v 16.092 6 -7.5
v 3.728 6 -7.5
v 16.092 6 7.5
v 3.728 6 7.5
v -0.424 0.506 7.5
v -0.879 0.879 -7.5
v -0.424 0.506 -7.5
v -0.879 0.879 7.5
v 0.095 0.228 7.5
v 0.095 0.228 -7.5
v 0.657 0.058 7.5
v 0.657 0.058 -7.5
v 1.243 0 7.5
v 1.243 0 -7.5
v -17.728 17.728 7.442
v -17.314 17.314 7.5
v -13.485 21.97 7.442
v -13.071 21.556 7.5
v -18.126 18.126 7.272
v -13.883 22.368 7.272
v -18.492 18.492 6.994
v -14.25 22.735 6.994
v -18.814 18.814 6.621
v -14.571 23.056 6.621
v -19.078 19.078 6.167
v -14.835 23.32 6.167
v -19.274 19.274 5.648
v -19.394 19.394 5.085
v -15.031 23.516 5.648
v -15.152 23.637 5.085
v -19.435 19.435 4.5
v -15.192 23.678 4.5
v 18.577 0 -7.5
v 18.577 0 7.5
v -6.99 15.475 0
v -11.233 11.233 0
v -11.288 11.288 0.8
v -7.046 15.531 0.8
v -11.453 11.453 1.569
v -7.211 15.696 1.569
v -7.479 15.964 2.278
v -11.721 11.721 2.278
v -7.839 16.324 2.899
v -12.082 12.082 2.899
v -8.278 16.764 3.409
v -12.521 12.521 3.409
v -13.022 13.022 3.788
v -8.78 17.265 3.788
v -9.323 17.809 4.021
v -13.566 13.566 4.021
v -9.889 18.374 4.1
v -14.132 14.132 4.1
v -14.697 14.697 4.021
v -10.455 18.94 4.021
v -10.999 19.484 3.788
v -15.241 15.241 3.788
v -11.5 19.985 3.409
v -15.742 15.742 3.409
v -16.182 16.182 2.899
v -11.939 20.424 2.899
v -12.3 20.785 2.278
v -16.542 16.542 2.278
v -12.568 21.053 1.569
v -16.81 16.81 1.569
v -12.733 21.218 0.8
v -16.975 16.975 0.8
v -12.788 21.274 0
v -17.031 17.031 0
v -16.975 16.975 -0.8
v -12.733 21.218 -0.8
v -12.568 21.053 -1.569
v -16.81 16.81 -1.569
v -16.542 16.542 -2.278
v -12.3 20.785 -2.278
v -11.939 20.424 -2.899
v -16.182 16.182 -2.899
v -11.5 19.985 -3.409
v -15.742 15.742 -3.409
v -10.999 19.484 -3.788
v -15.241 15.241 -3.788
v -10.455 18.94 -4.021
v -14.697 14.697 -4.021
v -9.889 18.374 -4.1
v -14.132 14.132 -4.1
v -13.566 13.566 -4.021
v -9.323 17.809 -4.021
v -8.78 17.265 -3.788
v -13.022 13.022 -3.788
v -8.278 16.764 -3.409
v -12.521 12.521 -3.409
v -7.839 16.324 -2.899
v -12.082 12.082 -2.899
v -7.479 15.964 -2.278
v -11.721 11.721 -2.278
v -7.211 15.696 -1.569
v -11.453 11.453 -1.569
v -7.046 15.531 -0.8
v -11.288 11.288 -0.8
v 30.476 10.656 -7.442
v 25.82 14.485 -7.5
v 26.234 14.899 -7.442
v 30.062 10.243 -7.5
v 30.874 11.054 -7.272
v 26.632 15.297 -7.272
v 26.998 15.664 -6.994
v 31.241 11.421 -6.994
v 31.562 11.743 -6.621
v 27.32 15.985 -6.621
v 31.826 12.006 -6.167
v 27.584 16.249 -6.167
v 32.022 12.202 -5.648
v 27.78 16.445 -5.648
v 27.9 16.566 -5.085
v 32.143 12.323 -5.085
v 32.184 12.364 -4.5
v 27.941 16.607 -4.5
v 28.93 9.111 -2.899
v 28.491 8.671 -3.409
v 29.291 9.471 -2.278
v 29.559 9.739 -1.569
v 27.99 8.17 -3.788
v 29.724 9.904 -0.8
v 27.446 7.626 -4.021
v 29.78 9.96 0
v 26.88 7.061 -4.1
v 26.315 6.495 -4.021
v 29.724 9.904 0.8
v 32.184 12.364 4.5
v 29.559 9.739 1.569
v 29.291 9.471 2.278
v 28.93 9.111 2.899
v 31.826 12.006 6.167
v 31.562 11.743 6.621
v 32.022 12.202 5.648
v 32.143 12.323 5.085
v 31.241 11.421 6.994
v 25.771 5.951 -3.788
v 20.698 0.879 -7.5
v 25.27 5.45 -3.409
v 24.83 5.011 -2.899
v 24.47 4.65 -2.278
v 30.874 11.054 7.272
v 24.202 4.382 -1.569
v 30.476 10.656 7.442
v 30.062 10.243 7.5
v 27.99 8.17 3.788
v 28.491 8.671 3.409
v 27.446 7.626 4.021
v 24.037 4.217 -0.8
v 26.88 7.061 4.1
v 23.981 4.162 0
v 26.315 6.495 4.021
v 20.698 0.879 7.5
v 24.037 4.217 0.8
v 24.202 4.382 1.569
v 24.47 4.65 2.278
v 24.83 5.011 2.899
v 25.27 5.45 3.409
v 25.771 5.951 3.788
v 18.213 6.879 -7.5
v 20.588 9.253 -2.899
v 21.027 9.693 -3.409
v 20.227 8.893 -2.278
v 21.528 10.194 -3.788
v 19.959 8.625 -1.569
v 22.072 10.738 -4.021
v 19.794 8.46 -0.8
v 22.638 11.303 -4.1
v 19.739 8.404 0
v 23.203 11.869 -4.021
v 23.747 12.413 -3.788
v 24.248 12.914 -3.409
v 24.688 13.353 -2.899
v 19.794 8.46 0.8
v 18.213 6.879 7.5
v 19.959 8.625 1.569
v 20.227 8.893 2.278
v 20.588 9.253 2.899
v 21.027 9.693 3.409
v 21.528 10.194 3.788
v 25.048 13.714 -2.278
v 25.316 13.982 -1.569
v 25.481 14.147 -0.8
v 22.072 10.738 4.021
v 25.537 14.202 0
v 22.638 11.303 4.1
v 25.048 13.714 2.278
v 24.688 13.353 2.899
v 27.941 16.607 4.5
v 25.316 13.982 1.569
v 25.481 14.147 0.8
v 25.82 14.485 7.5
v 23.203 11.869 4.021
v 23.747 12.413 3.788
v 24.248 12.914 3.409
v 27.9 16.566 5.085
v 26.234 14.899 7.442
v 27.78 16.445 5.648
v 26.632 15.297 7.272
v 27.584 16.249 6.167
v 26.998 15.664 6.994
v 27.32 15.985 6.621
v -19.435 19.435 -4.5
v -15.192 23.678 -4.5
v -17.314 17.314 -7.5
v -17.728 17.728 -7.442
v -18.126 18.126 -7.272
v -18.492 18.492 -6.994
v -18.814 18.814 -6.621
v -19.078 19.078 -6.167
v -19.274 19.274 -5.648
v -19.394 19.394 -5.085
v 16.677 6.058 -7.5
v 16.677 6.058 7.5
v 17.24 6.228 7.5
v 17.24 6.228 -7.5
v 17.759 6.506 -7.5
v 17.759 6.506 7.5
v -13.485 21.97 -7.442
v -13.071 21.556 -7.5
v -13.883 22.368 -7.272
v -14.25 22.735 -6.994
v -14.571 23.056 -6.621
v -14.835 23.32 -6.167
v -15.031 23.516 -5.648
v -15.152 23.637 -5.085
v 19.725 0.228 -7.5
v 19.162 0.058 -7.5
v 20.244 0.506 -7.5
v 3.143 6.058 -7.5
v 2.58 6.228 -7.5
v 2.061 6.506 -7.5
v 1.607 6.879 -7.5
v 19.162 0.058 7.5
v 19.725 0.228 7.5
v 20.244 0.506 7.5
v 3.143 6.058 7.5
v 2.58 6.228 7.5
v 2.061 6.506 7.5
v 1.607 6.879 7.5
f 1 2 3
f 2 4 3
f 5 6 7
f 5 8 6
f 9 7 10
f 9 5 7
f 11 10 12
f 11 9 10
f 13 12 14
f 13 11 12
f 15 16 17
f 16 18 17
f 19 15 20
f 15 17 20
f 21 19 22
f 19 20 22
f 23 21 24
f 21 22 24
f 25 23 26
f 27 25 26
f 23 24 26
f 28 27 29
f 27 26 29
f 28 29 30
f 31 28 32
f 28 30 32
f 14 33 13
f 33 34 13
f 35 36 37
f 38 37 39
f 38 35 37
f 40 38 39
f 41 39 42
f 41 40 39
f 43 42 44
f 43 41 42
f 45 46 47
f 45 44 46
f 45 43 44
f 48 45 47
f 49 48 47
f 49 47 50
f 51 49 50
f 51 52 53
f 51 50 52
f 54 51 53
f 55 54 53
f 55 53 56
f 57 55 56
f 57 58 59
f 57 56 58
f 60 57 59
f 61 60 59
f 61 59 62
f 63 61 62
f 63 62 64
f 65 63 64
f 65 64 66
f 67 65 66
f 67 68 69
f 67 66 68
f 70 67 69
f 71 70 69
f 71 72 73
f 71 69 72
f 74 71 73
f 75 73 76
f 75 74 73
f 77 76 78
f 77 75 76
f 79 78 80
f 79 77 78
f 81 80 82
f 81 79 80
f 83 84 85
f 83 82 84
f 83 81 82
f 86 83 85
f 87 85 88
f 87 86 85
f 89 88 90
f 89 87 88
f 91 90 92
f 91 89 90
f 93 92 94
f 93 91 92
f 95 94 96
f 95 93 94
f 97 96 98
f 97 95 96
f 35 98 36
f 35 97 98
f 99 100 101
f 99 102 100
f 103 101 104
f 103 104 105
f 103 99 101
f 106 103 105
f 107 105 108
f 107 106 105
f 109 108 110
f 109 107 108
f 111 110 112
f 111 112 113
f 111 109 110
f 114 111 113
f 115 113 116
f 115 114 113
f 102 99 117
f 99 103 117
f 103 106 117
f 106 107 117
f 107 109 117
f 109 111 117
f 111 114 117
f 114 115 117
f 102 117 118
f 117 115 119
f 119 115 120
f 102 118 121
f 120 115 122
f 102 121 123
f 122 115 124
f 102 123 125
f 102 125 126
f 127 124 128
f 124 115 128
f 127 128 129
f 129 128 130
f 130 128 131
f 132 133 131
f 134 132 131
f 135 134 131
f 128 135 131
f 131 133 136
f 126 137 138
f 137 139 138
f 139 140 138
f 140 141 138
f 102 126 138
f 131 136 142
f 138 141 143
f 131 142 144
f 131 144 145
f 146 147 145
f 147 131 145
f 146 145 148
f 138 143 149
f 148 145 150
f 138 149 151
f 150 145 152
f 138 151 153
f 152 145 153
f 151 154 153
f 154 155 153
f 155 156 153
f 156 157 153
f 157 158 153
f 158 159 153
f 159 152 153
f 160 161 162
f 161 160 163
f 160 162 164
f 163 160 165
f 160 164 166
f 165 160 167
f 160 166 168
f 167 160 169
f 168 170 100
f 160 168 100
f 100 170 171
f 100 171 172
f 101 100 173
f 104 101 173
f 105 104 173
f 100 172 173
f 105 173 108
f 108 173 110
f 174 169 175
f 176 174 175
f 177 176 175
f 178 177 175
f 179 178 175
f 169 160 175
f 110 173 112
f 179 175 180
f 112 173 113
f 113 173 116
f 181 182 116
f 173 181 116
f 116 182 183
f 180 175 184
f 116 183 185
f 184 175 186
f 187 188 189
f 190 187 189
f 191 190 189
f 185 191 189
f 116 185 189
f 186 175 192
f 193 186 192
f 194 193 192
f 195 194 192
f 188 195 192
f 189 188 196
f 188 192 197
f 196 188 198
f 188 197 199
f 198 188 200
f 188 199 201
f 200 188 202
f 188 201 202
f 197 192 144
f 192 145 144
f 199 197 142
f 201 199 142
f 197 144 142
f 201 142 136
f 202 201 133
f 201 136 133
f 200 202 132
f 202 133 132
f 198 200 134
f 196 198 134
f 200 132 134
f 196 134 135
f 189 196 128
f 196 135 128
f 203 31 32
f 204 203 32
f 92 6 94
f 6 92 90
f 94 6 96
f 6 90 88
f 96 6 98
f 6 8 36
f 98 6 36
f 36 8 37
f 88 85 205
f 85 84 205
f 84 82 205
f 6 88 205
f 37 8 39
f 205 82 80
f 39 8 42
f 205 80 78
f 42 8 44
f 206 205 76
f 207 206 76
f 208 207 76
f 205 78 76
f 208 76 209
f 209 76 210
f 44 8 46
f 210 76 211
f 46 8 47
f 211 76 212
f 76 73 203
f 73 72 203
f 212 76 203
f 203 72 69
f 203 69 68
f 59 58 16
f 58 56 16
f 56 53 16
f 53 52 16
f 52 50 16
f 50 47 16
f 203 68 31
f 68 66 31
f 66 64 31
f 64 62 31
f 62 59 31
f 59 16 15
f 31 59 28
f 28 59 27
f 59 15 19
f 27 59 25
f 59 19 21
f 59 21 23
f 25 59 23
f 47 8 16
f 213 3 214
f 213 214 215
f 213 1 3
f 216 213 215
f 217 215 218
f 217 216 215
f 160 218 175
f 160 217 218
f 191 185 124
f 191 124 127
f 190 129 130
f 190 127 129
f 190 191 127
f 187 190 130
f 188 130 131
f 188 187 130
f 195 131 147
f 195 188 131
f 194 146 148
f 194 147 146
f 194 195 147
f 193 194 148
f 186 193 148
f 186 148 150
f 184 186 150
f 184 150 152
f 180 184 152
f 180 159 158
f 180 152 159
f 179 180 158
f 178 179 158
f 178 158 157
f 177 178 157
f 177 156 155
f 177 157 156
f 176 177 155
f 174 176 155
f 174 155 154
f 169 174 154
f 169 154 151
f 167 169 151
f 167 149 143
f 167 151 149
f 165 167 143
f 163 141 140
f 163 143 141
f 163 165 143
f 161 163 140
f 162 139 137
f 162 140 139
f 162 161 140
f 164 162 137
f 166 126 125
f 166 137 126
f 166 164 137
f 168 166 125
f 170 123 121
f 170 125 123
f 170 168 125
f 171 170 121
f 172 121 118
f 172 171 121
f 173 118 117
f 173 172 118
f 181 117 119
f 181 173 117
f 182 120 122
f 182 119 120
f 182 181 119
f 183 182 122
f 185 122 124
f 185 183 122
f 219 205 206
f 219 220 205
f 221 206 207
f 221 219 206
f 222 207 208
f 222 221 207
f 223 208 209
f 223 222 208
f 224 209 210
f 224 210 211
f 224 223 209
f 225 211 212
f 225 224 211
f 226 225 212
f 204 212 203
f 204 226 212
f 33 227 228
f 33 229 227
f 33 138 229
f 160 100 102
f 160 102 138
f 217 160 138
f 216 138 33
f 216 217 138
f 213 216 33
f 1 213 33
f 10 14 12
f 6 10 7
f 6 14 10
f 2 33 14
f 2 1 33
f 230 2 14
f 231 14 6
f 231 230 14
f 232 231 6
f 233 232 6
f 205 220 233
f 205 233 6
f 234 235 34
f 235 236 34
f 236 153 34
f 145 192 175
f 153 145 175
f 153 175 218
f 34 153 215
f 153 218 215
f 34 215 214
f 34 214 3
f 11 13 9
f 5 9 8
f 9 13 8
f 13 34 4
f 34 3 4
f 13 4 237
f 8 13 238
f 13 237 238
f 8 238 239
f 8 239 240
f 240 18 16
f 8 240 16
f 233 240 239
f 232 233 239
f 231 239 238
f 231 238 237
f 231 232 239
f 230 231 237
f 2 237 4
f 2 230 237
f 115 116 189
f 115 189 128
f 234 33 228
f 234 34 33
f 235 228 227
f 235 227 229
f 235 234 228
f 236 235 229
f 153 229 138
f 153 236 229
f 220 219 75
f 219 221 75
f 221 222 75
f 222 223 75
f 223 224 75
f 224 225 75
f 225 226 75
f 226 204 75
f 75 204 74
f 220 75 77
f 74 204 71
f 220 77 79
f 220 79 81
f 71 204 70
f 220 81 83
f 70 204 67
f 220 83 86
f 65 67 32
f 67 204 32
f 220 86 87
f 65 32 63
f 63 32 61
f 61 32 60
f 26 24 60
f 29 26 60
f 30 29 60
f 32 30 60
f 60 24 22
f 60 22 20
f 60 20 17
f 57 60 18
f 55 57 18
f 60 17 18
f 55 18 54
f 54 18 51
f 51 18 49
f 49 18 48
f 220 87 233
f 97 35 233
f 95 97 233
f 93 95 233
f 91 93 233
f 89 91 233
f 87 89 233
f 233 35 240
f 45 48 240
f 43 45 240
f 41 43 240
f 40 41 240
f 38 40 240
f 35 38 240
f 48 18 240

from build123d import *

# Parameters (mm, degrees)
EXTRUDE_1_DEPTH          = 7.5
CUT_EXTRUDE_1_DEPTH      = 41.653128295
CUT_EXTRUDE_1_DEPTH_BACK = 41.653128295
SKETCH_2_R               = 4.1
CUT_EXTRUDE_2_DEPTH      = 46.227204203
CUT_EXTRUDE_2_DEPTH_BACK = 46.227204203
SKETCH_3_R               = 4.1
FILLET_1_R               = 3


with BuildPart() as part:
    # ｽｹｯﾁ1 → ﾎﾞｽ - 押し出し1 (new, symmetric)
    with BuildSketch(Plane.XY):
        Polygon((0, 0), (-19.435028843, 19.435028843), (-15.192388155, 23.67766953), (2.485281374, 6), (17.334523779, 6), (27.941125497, 16.606601718), (32.183766184, 12.363961031), (19.819805153, 0), align=None)
    extrude(amount=EXTRUDE_1_DEPTH, both=True)

    # ｽｹｯﾁ2 → ｶｯﾄ - 押し出し1 (cut, two sides: drawn at the far end of the back side and taken through both)
    with BuildSketch(Plane(origin=(0, 0, 0), x_dir=(0, 0, 1), z_dir=(-0.7071067811865487, -0.7071067811865464, 0)).offset(-CUT_EXTRUDE_1_DEPTH_BACK)):
        with Locations(Location((0, 19.985281374, 0), (0, 0, 270))):
            Circle(SKETCH_2_R)
    extrude(amount=CUT_EXTRUDE_1_DEPTH + CUT_EXTRUDE_1_DEPTH_BACK, mode=Mode.SUBTRACT)

    # ｽｹｯﾁ3 → ｶｯﾄ - 押し出し2 (cut, two sides: drawn at the far end of the back side and taken through both)
    with BuildSketch(Plane(origin=(9.909902577, -9.909902577, 0), x_dir=(0, 0, -1), z_dir=(0.707106781186549, -0.7071067811865461, 0)).offset(-CUT_EXTRUDE_2_DEPTH_BACK)):
        with Locations(Location((0, 24, 0), (0, 0, 90))):
            Circle(SKETCH_3_R)
    extrude(amount=CUT_EXTRUDE_2_DEPTH + CUT_EXTRUDE_2_DEPTH_BACK, mode=Mode.SUBTRACT)

    # ﾌｨﾚｯﾄ1
    fillet_1_edges = [part.edges().sort_by_distance(p)[0] for p in [
        (30.062445841, 14.485281374, -7.5),
        (30.062445841, 14.485281374, 7.5),
        (0, 0, 0),
        (2.485281374, 6, 0),
        (17.334523779, 6, 0),
        (19.819805153, 0, 0),
        (-17.313708499, 21.556349186, 7.5),
        (-17.313708499, 21.556349186, -7.5),
    ]]
    fillet(fillet_1_edges, radius=FILLET_1_R)


solid = part.part
